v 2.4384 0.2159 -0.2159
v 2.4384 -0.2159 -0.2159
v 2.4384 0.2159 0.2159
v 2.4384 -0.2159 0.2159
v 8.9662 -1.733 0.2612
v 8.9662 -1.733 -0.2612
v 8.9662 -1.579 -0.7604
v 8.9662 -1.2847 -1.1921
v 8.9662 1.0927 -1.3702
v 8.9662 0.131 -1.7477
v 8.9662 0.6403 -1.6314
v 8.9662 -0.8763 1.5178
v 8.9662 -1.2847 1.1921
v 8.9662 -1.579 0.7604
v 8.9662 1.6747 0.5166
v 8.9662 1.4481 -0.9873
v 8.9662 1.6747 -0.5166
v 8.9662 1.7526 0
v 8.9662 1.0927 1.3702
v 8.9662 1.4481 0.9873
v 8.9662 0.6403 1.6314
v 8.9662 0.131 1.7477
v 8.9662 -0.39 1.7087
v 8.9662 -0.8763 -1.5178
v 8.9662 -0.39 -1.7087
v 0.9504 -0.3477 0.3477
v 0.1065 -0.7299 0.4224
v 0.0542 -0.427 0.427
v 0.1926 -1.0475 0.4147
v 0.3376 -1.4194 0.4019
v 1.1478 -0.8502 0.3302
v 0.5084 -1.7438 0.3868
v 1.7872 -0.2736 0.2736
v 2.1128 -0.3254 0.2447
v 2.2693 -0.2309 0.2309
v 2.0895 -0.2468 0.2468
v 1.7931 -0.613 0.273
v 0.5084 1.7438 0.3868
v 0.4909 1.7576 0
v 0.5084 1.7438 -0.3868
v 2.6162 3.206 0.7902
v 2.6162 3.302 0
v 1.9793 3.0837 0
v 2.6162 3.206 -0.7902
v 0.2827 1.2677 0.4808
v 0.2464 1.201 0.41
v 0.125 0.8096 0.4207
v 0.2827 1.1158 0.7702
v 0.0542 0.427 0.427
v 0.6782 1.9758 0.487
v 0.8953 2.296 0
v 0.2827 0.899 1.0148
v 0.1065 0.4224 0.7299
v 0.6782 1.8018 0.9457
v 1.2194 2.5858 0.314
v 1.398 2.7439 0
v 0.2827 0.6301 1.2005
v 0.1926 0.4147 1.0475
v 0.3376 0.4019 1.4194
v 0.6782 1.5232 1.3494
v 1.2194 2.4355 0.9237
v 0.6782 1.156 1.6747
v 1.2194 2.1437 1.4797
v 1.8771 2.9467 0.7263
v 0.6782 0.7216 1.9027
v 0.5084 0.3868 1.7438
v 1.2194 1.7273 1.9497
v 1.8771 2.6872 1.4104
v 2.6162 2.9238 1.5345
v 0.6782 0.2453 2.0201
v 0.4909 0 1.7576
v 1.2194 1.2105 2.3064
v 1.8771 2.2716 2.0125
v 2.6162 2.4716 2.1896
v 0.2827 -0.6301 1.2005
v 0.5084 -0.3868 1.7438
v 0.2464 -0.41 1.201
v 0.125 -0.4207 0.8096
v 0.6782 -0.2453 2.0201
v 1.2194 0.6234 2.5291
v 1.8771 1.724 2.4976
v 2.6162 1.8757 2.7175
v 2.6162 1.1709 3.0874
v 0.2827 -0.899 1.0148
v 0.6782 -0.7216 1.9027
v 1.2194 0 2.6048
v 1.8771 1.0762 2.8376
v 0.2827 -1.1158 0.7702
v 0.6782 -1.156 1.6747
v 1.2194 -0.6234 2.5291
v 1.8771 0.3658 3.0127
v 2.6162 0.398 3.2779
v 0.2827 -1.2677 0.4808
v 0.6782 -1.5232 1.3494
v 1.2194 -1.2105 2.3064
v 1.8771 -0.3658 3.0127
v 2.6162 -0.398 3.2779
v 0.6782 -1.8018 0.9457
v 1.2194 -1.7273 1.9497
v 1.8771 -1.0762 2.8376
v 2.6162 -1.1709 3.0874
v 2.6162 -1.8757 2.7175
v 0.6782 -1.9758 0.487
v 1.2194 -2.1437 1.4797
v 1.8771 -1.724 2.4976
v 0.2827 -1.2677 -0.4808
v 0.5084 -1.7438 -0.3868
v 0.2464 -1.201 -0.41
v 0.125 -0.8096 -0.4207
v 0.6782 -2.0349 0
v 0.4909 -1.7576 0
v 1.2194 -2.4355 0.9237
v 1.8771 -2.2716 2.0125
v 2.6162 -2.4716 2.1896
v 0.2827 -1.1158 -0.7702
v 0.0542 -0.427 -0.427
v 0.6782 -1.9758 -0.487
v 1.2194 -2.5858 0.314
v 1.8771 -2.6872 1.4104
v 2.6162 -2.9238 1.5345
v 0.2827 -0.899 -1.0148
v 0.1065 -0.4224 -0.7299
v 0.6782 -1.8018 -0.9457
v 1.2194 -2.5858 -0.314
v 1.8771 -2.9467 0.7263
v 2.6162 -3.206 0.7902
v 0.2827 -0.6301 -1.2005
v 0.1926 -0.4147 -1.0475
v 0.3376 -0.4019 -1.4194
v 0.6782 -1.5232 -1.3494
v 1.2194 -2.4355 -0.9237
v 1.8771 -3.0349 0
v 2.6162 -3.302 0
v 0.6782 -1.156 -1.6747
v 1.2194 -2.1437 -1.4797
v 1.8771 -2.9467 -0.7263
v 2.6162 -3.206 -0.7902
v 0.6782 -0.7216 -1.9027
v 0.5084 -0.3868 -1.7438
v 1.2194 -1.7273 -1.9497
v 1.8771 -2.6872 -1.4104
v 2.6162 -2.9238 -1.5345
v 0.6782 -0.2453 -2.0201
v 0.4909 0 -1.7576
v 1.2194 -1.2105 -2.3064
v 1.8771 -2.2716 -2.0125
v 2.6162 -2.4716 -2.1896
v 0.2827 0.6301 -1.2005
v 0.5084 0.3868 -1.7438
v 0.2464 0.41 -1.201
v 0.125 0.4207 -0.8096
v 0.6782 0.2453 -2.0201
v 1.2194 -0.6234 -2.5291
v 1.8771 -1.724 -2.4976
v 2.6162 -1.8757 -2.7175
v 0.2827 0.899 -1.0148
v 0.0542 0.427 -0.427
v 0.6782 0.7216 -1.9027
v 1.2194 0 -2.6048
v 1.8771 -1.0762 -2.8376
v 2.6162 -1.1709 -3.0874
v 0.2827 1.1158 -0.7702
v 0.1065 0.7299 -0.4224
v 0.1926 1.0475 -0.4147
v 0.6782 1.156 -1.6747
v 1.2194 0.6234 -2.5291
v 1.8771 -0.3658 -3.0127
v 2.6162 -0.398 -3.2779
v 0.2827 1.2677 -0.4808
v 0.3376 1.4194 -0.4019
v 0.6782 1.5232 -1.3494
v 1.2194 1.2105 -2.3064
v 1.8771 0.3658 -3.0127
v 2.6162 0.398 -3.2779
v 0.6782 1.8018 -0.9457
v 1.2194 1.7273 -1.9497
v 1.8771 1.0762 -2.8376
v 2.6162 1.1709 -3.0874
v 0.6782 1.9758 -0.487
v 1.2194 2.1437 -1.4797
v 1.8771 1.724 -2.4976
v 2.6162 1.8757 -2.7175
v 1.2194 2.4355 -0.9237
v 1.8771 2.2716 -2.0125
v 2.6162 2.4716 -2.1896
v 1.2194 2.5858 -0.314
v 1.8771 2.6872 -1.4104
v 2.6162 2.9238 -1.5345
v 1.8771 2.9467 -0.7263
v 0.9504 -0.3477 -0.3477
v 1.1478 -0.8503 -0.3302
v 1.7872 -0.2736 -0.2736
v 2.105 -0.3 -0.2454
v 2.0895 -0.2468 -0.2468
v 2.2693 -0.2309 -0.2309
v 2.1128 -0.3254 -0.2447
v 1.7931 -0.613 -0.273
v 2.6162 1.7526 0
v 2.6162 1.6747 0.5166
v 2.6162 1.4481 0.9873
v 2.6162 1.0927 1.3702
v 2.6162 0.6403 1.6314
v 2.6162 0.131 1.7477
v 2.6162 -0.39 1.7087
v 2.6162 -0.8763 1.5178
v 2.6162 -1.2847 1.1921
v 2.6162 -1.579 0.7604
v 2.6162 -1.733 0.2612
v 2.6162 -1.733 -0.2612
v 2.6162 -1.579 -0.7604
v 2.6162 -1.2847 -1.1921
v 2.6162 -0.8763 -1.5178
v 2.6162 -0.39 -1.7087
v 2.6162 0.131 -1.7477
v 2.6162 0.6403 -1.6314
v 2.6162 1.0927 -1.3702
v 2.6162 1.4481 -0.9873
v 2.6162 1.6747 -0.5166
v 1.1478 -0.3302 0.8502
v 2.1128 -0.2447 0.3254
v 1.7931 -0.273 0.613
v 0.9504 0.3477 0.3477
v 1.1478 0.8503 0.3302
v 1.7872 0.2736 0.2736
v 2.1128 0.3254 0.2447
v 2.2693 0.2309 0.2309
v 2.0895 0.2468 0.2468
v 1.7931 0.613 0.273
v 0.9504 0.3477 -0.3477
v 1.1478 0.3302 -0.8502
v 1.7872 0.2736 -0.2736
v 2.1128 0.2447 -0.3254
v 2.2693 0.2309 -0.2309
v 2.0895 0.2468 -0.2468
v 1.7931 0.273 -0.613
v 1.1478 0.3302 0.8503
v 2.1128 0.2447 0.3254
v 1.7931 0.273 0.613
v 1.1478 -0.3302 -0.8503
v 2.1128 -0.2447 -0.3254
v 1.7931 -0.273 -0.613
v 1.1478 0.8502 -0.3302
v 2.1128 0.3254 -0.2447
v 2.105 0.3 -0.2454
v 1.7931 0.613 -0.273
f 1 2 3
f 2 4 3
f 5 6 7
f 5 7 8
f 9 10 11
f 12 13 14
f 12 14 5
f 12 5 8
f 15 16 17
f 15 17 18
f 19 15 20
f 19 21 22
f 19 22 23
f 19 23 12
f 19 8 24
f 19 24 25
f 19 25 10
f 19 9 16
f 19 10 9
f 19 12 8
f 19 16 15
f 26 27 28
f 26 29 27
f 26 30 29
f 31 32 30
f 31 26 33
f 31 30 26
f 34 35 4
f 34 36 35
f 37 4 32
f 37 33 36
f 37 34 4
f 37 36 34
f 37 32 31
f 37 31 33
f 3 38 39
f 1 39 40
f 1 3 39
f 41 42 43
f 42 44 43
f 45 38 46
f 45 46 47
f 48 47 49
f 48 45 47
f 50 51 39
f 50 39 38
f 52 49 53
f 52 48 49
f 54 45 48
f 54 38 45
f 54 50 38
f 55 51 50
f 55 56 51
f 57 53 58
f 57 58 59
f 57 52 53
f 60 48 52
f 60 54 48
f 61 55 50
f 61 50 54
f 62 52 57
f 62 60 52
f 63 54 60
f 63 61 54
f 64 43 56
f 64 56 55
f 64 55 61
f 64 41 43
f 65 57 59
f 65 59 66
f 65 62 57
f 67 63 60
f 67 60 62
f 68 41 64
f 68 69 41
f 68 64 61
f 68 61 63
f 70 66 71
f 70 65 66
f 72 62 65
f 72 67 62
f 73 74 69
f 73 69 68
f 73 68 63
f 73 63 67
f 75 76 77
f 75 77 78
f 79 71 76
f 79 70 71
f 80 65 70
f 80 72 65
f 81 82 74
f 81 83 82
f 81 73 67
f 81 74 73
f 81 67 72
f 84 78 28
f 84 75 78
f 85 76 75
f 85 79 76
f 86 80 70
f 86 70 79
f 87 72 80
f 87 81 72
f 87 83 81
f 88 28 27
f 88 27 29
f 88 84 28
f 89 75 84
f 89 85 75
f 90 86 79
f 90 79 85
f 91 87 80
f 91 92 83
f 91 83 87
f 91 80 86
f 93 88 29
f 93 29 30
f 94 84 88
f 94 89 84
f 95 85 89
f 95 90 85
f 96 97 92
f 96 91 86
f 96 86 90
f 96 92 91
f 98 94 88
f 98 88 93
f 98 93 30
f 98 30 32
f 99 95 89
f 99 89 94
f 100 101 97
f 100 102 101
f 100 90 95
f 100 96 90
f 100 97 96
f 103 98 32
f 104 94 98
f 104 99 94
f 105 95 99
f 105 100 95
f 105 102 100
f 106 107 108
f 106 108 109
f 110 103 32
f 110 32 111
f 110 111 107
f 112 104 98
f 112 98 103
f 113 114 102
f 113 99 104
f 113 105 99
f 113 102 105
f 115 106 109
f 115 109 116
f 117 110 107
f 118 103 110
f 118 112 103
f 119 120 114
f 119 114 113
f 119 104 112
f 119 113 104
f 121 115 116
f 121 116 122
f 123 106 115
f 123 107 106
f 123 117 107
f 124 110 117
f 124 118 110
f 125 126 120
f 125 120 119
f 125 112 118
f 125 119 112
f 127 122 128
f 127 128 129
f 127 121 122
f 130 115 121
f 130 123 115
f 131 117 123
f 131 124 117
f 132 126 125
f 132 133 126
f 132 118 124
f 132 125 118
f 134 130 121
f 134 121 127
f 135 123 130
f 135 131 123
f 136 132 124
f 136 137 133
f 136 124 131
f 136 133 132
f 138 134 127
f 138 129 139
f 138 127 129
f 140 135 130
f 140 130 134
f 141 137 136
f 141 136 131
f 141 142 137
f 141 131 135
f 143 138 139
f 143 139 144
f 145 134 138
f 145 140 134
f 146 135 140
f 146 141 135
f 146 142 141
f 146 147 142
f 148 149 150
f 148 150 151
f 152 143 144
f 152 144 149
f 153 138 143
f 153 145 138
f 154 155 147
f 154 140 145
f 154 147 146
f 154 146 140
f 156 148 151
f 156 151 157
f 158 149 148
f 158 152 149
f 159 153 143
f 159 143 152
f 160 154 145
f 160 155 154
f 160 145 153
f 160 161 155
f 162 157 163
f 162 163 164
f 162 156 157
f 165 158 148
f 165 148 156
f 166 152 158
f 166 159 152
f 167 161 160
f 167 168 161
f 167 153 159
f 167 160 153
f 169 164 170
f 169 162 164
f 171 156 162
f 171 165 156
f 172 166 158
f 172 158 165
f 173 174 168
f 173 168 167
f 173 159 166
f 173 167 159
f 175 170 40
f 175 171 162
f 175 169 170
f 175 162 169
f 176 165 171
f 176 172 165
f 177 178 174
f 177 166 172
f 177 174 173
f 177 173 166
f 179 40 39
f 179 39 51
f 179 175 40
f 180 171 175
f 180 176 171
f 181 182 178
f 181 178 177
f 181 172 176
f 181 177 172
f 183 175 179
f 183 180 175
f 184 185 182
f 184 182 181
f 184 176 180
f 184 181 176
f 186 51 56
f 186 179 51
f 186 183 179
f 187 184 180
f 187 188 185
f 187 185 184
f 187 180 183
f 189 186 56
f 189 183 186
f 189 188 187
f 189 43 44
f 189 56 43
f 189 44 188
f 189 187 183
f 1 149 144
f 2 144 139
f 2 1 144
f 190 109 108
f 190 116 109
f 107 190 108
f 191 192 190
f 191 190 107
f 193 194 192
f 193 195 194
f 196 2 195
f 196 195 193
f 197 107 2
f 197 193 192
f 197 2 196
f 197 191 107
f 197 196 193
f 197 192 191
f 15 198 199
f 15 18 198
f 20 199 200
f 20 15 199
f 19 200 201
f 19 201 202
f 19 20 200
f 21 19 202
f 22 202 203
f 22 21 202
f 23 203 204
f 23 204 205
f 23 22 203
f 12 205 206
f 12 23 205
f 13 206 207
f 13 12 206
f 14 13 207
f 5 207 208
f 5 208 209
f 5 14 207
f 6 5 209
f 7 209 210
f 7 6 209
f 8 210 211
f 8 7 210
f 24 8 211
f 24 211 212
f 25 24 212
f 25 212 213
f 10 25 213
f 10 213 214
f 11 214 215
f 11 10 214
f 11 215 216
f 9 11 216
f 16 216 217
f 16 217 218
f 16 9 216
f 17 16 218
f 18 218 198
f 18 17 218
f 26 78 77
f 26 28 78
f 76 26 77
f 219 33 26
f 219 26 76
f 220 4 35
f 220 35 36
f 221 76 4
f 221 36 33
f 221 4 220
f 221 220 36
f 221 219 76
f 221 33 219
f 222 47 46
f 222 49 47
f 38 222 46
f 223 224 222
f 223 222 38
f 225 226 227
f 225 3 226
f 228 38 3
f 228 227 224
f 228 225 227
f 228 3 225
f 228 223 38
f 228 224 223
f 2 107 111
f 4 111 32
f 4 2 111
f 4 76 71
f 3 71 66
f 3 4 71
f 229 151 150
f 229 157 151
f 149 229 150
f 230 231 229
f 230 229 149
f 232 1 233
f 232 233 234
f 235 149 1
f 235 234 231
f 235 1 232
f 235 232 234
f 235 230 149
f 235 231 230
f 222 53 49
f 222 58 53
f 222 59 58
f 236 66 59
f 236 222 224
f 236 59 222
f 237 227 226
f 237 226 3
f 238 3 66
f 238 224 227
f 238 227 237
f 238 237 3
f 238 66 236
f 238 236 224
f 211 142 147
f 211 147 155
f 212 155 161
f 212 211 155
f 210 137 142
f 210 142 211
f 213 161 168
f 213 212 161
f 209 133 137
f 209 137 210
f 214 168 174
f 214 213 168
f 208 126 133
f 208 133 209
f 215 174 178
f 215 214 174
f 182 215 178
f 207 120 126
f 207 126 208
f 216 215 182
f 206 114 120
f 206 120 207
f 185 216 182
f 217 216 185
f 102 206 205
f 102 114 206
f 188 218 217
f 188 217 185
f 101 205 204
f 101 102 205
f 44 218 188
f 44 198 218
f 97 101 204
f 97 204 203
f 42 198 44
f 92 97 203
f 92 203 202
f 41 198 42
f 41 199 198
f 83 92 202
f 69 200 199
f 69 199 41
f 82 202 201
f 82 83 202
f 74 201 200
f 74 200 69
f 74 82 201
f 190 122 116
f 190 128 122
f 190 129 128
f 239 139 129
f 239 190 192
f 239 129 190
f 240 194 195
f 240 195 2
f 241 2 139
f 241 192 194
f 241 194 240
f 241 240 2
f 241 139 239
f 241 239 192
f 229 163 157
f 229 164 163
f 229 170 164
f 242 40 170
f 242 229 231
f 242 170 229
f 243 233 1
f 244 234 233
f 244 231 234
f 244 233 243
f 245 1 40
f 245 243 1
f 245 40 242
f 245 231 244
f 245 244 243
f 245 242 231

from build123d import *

# Parameters (mm, degrees)
CIRPATTERN1_COUNT = 2
CIRPATTERN1_ANGLE = 90


# Read off the part's stored shape, not the designer's step: ThreadSchematic
with BuildPart() as part:
    # ThreadSchematic outline → ThreadSchematic (revolve)
    with BuildSketch(Plane.YX):
        with BuildLine():
            Line((0, 8.9662), (0, 0))
            ThreePointArc((0, 0), (2.106401342, 0.733321609), (3.302000001, 2.616200001))
            Line((3.302000001, 2.616200001), (1.7526, 2.6162))
            Line((1.7526, 2.6162), (1.7526, 8.9662))
            Line((1.7526, 8.9662), (0, 8.9662))
        make_face()
    revolve(axis=Axis((0, 0, 0), (1, 0, 0)))

    # Sketch3 → Cross section 0
    with BuildSketch(Plane(origin=(0, 0, 0), x_dir=(0, 0, -1), z_dir=(1, 0, 0))):
        with BuildLine():
            Line((0.4318, -2.1463), (-0.4318, -2.1463))
            Line((-0.4318, -2.1463), (-0.4318, 2.1463))
            Line((-0.4318, 2.1463), (0.4318, 2.1463))
            Line((0.4318, 2.1463), (0.4318, -2.1463))
        make_face()
    # Sketch4 → Cross section 1
    with BuildSketch(Plane(origin=(2.4384, 0, 0), x_dir=(0, 0, -1), z_dir=(1, 0, 0))):
        with BuildLine():
            Line((0.2159, -0.2159), (-0.2159, -0.2159))
            Line((-0.2159, -0.2159), (-0.2159, 0.2159))
            Line((-0.2159, 0.2159), (0.2159, 0.2159))
            Line((0.2159, 0.2159), (0.2159, -0.2159))
        make_face()
    cross = loft(mode=Mode.SUBTRACT)

    # CirPattern1: Cross ×2 about axis
    cirpattern1_axis = Axis((0, 0, 0), (1, 0, 0))
    for i in range(1, CIRPATTERN1_COUNT):
        add(cross.rotate(cirpattern1_axis, i * CIRPATTERN1_ANGLE / (CIRPATTERN1_COUNT - 1)), mode=Mode.SUBTRACT)


solid = part.part
